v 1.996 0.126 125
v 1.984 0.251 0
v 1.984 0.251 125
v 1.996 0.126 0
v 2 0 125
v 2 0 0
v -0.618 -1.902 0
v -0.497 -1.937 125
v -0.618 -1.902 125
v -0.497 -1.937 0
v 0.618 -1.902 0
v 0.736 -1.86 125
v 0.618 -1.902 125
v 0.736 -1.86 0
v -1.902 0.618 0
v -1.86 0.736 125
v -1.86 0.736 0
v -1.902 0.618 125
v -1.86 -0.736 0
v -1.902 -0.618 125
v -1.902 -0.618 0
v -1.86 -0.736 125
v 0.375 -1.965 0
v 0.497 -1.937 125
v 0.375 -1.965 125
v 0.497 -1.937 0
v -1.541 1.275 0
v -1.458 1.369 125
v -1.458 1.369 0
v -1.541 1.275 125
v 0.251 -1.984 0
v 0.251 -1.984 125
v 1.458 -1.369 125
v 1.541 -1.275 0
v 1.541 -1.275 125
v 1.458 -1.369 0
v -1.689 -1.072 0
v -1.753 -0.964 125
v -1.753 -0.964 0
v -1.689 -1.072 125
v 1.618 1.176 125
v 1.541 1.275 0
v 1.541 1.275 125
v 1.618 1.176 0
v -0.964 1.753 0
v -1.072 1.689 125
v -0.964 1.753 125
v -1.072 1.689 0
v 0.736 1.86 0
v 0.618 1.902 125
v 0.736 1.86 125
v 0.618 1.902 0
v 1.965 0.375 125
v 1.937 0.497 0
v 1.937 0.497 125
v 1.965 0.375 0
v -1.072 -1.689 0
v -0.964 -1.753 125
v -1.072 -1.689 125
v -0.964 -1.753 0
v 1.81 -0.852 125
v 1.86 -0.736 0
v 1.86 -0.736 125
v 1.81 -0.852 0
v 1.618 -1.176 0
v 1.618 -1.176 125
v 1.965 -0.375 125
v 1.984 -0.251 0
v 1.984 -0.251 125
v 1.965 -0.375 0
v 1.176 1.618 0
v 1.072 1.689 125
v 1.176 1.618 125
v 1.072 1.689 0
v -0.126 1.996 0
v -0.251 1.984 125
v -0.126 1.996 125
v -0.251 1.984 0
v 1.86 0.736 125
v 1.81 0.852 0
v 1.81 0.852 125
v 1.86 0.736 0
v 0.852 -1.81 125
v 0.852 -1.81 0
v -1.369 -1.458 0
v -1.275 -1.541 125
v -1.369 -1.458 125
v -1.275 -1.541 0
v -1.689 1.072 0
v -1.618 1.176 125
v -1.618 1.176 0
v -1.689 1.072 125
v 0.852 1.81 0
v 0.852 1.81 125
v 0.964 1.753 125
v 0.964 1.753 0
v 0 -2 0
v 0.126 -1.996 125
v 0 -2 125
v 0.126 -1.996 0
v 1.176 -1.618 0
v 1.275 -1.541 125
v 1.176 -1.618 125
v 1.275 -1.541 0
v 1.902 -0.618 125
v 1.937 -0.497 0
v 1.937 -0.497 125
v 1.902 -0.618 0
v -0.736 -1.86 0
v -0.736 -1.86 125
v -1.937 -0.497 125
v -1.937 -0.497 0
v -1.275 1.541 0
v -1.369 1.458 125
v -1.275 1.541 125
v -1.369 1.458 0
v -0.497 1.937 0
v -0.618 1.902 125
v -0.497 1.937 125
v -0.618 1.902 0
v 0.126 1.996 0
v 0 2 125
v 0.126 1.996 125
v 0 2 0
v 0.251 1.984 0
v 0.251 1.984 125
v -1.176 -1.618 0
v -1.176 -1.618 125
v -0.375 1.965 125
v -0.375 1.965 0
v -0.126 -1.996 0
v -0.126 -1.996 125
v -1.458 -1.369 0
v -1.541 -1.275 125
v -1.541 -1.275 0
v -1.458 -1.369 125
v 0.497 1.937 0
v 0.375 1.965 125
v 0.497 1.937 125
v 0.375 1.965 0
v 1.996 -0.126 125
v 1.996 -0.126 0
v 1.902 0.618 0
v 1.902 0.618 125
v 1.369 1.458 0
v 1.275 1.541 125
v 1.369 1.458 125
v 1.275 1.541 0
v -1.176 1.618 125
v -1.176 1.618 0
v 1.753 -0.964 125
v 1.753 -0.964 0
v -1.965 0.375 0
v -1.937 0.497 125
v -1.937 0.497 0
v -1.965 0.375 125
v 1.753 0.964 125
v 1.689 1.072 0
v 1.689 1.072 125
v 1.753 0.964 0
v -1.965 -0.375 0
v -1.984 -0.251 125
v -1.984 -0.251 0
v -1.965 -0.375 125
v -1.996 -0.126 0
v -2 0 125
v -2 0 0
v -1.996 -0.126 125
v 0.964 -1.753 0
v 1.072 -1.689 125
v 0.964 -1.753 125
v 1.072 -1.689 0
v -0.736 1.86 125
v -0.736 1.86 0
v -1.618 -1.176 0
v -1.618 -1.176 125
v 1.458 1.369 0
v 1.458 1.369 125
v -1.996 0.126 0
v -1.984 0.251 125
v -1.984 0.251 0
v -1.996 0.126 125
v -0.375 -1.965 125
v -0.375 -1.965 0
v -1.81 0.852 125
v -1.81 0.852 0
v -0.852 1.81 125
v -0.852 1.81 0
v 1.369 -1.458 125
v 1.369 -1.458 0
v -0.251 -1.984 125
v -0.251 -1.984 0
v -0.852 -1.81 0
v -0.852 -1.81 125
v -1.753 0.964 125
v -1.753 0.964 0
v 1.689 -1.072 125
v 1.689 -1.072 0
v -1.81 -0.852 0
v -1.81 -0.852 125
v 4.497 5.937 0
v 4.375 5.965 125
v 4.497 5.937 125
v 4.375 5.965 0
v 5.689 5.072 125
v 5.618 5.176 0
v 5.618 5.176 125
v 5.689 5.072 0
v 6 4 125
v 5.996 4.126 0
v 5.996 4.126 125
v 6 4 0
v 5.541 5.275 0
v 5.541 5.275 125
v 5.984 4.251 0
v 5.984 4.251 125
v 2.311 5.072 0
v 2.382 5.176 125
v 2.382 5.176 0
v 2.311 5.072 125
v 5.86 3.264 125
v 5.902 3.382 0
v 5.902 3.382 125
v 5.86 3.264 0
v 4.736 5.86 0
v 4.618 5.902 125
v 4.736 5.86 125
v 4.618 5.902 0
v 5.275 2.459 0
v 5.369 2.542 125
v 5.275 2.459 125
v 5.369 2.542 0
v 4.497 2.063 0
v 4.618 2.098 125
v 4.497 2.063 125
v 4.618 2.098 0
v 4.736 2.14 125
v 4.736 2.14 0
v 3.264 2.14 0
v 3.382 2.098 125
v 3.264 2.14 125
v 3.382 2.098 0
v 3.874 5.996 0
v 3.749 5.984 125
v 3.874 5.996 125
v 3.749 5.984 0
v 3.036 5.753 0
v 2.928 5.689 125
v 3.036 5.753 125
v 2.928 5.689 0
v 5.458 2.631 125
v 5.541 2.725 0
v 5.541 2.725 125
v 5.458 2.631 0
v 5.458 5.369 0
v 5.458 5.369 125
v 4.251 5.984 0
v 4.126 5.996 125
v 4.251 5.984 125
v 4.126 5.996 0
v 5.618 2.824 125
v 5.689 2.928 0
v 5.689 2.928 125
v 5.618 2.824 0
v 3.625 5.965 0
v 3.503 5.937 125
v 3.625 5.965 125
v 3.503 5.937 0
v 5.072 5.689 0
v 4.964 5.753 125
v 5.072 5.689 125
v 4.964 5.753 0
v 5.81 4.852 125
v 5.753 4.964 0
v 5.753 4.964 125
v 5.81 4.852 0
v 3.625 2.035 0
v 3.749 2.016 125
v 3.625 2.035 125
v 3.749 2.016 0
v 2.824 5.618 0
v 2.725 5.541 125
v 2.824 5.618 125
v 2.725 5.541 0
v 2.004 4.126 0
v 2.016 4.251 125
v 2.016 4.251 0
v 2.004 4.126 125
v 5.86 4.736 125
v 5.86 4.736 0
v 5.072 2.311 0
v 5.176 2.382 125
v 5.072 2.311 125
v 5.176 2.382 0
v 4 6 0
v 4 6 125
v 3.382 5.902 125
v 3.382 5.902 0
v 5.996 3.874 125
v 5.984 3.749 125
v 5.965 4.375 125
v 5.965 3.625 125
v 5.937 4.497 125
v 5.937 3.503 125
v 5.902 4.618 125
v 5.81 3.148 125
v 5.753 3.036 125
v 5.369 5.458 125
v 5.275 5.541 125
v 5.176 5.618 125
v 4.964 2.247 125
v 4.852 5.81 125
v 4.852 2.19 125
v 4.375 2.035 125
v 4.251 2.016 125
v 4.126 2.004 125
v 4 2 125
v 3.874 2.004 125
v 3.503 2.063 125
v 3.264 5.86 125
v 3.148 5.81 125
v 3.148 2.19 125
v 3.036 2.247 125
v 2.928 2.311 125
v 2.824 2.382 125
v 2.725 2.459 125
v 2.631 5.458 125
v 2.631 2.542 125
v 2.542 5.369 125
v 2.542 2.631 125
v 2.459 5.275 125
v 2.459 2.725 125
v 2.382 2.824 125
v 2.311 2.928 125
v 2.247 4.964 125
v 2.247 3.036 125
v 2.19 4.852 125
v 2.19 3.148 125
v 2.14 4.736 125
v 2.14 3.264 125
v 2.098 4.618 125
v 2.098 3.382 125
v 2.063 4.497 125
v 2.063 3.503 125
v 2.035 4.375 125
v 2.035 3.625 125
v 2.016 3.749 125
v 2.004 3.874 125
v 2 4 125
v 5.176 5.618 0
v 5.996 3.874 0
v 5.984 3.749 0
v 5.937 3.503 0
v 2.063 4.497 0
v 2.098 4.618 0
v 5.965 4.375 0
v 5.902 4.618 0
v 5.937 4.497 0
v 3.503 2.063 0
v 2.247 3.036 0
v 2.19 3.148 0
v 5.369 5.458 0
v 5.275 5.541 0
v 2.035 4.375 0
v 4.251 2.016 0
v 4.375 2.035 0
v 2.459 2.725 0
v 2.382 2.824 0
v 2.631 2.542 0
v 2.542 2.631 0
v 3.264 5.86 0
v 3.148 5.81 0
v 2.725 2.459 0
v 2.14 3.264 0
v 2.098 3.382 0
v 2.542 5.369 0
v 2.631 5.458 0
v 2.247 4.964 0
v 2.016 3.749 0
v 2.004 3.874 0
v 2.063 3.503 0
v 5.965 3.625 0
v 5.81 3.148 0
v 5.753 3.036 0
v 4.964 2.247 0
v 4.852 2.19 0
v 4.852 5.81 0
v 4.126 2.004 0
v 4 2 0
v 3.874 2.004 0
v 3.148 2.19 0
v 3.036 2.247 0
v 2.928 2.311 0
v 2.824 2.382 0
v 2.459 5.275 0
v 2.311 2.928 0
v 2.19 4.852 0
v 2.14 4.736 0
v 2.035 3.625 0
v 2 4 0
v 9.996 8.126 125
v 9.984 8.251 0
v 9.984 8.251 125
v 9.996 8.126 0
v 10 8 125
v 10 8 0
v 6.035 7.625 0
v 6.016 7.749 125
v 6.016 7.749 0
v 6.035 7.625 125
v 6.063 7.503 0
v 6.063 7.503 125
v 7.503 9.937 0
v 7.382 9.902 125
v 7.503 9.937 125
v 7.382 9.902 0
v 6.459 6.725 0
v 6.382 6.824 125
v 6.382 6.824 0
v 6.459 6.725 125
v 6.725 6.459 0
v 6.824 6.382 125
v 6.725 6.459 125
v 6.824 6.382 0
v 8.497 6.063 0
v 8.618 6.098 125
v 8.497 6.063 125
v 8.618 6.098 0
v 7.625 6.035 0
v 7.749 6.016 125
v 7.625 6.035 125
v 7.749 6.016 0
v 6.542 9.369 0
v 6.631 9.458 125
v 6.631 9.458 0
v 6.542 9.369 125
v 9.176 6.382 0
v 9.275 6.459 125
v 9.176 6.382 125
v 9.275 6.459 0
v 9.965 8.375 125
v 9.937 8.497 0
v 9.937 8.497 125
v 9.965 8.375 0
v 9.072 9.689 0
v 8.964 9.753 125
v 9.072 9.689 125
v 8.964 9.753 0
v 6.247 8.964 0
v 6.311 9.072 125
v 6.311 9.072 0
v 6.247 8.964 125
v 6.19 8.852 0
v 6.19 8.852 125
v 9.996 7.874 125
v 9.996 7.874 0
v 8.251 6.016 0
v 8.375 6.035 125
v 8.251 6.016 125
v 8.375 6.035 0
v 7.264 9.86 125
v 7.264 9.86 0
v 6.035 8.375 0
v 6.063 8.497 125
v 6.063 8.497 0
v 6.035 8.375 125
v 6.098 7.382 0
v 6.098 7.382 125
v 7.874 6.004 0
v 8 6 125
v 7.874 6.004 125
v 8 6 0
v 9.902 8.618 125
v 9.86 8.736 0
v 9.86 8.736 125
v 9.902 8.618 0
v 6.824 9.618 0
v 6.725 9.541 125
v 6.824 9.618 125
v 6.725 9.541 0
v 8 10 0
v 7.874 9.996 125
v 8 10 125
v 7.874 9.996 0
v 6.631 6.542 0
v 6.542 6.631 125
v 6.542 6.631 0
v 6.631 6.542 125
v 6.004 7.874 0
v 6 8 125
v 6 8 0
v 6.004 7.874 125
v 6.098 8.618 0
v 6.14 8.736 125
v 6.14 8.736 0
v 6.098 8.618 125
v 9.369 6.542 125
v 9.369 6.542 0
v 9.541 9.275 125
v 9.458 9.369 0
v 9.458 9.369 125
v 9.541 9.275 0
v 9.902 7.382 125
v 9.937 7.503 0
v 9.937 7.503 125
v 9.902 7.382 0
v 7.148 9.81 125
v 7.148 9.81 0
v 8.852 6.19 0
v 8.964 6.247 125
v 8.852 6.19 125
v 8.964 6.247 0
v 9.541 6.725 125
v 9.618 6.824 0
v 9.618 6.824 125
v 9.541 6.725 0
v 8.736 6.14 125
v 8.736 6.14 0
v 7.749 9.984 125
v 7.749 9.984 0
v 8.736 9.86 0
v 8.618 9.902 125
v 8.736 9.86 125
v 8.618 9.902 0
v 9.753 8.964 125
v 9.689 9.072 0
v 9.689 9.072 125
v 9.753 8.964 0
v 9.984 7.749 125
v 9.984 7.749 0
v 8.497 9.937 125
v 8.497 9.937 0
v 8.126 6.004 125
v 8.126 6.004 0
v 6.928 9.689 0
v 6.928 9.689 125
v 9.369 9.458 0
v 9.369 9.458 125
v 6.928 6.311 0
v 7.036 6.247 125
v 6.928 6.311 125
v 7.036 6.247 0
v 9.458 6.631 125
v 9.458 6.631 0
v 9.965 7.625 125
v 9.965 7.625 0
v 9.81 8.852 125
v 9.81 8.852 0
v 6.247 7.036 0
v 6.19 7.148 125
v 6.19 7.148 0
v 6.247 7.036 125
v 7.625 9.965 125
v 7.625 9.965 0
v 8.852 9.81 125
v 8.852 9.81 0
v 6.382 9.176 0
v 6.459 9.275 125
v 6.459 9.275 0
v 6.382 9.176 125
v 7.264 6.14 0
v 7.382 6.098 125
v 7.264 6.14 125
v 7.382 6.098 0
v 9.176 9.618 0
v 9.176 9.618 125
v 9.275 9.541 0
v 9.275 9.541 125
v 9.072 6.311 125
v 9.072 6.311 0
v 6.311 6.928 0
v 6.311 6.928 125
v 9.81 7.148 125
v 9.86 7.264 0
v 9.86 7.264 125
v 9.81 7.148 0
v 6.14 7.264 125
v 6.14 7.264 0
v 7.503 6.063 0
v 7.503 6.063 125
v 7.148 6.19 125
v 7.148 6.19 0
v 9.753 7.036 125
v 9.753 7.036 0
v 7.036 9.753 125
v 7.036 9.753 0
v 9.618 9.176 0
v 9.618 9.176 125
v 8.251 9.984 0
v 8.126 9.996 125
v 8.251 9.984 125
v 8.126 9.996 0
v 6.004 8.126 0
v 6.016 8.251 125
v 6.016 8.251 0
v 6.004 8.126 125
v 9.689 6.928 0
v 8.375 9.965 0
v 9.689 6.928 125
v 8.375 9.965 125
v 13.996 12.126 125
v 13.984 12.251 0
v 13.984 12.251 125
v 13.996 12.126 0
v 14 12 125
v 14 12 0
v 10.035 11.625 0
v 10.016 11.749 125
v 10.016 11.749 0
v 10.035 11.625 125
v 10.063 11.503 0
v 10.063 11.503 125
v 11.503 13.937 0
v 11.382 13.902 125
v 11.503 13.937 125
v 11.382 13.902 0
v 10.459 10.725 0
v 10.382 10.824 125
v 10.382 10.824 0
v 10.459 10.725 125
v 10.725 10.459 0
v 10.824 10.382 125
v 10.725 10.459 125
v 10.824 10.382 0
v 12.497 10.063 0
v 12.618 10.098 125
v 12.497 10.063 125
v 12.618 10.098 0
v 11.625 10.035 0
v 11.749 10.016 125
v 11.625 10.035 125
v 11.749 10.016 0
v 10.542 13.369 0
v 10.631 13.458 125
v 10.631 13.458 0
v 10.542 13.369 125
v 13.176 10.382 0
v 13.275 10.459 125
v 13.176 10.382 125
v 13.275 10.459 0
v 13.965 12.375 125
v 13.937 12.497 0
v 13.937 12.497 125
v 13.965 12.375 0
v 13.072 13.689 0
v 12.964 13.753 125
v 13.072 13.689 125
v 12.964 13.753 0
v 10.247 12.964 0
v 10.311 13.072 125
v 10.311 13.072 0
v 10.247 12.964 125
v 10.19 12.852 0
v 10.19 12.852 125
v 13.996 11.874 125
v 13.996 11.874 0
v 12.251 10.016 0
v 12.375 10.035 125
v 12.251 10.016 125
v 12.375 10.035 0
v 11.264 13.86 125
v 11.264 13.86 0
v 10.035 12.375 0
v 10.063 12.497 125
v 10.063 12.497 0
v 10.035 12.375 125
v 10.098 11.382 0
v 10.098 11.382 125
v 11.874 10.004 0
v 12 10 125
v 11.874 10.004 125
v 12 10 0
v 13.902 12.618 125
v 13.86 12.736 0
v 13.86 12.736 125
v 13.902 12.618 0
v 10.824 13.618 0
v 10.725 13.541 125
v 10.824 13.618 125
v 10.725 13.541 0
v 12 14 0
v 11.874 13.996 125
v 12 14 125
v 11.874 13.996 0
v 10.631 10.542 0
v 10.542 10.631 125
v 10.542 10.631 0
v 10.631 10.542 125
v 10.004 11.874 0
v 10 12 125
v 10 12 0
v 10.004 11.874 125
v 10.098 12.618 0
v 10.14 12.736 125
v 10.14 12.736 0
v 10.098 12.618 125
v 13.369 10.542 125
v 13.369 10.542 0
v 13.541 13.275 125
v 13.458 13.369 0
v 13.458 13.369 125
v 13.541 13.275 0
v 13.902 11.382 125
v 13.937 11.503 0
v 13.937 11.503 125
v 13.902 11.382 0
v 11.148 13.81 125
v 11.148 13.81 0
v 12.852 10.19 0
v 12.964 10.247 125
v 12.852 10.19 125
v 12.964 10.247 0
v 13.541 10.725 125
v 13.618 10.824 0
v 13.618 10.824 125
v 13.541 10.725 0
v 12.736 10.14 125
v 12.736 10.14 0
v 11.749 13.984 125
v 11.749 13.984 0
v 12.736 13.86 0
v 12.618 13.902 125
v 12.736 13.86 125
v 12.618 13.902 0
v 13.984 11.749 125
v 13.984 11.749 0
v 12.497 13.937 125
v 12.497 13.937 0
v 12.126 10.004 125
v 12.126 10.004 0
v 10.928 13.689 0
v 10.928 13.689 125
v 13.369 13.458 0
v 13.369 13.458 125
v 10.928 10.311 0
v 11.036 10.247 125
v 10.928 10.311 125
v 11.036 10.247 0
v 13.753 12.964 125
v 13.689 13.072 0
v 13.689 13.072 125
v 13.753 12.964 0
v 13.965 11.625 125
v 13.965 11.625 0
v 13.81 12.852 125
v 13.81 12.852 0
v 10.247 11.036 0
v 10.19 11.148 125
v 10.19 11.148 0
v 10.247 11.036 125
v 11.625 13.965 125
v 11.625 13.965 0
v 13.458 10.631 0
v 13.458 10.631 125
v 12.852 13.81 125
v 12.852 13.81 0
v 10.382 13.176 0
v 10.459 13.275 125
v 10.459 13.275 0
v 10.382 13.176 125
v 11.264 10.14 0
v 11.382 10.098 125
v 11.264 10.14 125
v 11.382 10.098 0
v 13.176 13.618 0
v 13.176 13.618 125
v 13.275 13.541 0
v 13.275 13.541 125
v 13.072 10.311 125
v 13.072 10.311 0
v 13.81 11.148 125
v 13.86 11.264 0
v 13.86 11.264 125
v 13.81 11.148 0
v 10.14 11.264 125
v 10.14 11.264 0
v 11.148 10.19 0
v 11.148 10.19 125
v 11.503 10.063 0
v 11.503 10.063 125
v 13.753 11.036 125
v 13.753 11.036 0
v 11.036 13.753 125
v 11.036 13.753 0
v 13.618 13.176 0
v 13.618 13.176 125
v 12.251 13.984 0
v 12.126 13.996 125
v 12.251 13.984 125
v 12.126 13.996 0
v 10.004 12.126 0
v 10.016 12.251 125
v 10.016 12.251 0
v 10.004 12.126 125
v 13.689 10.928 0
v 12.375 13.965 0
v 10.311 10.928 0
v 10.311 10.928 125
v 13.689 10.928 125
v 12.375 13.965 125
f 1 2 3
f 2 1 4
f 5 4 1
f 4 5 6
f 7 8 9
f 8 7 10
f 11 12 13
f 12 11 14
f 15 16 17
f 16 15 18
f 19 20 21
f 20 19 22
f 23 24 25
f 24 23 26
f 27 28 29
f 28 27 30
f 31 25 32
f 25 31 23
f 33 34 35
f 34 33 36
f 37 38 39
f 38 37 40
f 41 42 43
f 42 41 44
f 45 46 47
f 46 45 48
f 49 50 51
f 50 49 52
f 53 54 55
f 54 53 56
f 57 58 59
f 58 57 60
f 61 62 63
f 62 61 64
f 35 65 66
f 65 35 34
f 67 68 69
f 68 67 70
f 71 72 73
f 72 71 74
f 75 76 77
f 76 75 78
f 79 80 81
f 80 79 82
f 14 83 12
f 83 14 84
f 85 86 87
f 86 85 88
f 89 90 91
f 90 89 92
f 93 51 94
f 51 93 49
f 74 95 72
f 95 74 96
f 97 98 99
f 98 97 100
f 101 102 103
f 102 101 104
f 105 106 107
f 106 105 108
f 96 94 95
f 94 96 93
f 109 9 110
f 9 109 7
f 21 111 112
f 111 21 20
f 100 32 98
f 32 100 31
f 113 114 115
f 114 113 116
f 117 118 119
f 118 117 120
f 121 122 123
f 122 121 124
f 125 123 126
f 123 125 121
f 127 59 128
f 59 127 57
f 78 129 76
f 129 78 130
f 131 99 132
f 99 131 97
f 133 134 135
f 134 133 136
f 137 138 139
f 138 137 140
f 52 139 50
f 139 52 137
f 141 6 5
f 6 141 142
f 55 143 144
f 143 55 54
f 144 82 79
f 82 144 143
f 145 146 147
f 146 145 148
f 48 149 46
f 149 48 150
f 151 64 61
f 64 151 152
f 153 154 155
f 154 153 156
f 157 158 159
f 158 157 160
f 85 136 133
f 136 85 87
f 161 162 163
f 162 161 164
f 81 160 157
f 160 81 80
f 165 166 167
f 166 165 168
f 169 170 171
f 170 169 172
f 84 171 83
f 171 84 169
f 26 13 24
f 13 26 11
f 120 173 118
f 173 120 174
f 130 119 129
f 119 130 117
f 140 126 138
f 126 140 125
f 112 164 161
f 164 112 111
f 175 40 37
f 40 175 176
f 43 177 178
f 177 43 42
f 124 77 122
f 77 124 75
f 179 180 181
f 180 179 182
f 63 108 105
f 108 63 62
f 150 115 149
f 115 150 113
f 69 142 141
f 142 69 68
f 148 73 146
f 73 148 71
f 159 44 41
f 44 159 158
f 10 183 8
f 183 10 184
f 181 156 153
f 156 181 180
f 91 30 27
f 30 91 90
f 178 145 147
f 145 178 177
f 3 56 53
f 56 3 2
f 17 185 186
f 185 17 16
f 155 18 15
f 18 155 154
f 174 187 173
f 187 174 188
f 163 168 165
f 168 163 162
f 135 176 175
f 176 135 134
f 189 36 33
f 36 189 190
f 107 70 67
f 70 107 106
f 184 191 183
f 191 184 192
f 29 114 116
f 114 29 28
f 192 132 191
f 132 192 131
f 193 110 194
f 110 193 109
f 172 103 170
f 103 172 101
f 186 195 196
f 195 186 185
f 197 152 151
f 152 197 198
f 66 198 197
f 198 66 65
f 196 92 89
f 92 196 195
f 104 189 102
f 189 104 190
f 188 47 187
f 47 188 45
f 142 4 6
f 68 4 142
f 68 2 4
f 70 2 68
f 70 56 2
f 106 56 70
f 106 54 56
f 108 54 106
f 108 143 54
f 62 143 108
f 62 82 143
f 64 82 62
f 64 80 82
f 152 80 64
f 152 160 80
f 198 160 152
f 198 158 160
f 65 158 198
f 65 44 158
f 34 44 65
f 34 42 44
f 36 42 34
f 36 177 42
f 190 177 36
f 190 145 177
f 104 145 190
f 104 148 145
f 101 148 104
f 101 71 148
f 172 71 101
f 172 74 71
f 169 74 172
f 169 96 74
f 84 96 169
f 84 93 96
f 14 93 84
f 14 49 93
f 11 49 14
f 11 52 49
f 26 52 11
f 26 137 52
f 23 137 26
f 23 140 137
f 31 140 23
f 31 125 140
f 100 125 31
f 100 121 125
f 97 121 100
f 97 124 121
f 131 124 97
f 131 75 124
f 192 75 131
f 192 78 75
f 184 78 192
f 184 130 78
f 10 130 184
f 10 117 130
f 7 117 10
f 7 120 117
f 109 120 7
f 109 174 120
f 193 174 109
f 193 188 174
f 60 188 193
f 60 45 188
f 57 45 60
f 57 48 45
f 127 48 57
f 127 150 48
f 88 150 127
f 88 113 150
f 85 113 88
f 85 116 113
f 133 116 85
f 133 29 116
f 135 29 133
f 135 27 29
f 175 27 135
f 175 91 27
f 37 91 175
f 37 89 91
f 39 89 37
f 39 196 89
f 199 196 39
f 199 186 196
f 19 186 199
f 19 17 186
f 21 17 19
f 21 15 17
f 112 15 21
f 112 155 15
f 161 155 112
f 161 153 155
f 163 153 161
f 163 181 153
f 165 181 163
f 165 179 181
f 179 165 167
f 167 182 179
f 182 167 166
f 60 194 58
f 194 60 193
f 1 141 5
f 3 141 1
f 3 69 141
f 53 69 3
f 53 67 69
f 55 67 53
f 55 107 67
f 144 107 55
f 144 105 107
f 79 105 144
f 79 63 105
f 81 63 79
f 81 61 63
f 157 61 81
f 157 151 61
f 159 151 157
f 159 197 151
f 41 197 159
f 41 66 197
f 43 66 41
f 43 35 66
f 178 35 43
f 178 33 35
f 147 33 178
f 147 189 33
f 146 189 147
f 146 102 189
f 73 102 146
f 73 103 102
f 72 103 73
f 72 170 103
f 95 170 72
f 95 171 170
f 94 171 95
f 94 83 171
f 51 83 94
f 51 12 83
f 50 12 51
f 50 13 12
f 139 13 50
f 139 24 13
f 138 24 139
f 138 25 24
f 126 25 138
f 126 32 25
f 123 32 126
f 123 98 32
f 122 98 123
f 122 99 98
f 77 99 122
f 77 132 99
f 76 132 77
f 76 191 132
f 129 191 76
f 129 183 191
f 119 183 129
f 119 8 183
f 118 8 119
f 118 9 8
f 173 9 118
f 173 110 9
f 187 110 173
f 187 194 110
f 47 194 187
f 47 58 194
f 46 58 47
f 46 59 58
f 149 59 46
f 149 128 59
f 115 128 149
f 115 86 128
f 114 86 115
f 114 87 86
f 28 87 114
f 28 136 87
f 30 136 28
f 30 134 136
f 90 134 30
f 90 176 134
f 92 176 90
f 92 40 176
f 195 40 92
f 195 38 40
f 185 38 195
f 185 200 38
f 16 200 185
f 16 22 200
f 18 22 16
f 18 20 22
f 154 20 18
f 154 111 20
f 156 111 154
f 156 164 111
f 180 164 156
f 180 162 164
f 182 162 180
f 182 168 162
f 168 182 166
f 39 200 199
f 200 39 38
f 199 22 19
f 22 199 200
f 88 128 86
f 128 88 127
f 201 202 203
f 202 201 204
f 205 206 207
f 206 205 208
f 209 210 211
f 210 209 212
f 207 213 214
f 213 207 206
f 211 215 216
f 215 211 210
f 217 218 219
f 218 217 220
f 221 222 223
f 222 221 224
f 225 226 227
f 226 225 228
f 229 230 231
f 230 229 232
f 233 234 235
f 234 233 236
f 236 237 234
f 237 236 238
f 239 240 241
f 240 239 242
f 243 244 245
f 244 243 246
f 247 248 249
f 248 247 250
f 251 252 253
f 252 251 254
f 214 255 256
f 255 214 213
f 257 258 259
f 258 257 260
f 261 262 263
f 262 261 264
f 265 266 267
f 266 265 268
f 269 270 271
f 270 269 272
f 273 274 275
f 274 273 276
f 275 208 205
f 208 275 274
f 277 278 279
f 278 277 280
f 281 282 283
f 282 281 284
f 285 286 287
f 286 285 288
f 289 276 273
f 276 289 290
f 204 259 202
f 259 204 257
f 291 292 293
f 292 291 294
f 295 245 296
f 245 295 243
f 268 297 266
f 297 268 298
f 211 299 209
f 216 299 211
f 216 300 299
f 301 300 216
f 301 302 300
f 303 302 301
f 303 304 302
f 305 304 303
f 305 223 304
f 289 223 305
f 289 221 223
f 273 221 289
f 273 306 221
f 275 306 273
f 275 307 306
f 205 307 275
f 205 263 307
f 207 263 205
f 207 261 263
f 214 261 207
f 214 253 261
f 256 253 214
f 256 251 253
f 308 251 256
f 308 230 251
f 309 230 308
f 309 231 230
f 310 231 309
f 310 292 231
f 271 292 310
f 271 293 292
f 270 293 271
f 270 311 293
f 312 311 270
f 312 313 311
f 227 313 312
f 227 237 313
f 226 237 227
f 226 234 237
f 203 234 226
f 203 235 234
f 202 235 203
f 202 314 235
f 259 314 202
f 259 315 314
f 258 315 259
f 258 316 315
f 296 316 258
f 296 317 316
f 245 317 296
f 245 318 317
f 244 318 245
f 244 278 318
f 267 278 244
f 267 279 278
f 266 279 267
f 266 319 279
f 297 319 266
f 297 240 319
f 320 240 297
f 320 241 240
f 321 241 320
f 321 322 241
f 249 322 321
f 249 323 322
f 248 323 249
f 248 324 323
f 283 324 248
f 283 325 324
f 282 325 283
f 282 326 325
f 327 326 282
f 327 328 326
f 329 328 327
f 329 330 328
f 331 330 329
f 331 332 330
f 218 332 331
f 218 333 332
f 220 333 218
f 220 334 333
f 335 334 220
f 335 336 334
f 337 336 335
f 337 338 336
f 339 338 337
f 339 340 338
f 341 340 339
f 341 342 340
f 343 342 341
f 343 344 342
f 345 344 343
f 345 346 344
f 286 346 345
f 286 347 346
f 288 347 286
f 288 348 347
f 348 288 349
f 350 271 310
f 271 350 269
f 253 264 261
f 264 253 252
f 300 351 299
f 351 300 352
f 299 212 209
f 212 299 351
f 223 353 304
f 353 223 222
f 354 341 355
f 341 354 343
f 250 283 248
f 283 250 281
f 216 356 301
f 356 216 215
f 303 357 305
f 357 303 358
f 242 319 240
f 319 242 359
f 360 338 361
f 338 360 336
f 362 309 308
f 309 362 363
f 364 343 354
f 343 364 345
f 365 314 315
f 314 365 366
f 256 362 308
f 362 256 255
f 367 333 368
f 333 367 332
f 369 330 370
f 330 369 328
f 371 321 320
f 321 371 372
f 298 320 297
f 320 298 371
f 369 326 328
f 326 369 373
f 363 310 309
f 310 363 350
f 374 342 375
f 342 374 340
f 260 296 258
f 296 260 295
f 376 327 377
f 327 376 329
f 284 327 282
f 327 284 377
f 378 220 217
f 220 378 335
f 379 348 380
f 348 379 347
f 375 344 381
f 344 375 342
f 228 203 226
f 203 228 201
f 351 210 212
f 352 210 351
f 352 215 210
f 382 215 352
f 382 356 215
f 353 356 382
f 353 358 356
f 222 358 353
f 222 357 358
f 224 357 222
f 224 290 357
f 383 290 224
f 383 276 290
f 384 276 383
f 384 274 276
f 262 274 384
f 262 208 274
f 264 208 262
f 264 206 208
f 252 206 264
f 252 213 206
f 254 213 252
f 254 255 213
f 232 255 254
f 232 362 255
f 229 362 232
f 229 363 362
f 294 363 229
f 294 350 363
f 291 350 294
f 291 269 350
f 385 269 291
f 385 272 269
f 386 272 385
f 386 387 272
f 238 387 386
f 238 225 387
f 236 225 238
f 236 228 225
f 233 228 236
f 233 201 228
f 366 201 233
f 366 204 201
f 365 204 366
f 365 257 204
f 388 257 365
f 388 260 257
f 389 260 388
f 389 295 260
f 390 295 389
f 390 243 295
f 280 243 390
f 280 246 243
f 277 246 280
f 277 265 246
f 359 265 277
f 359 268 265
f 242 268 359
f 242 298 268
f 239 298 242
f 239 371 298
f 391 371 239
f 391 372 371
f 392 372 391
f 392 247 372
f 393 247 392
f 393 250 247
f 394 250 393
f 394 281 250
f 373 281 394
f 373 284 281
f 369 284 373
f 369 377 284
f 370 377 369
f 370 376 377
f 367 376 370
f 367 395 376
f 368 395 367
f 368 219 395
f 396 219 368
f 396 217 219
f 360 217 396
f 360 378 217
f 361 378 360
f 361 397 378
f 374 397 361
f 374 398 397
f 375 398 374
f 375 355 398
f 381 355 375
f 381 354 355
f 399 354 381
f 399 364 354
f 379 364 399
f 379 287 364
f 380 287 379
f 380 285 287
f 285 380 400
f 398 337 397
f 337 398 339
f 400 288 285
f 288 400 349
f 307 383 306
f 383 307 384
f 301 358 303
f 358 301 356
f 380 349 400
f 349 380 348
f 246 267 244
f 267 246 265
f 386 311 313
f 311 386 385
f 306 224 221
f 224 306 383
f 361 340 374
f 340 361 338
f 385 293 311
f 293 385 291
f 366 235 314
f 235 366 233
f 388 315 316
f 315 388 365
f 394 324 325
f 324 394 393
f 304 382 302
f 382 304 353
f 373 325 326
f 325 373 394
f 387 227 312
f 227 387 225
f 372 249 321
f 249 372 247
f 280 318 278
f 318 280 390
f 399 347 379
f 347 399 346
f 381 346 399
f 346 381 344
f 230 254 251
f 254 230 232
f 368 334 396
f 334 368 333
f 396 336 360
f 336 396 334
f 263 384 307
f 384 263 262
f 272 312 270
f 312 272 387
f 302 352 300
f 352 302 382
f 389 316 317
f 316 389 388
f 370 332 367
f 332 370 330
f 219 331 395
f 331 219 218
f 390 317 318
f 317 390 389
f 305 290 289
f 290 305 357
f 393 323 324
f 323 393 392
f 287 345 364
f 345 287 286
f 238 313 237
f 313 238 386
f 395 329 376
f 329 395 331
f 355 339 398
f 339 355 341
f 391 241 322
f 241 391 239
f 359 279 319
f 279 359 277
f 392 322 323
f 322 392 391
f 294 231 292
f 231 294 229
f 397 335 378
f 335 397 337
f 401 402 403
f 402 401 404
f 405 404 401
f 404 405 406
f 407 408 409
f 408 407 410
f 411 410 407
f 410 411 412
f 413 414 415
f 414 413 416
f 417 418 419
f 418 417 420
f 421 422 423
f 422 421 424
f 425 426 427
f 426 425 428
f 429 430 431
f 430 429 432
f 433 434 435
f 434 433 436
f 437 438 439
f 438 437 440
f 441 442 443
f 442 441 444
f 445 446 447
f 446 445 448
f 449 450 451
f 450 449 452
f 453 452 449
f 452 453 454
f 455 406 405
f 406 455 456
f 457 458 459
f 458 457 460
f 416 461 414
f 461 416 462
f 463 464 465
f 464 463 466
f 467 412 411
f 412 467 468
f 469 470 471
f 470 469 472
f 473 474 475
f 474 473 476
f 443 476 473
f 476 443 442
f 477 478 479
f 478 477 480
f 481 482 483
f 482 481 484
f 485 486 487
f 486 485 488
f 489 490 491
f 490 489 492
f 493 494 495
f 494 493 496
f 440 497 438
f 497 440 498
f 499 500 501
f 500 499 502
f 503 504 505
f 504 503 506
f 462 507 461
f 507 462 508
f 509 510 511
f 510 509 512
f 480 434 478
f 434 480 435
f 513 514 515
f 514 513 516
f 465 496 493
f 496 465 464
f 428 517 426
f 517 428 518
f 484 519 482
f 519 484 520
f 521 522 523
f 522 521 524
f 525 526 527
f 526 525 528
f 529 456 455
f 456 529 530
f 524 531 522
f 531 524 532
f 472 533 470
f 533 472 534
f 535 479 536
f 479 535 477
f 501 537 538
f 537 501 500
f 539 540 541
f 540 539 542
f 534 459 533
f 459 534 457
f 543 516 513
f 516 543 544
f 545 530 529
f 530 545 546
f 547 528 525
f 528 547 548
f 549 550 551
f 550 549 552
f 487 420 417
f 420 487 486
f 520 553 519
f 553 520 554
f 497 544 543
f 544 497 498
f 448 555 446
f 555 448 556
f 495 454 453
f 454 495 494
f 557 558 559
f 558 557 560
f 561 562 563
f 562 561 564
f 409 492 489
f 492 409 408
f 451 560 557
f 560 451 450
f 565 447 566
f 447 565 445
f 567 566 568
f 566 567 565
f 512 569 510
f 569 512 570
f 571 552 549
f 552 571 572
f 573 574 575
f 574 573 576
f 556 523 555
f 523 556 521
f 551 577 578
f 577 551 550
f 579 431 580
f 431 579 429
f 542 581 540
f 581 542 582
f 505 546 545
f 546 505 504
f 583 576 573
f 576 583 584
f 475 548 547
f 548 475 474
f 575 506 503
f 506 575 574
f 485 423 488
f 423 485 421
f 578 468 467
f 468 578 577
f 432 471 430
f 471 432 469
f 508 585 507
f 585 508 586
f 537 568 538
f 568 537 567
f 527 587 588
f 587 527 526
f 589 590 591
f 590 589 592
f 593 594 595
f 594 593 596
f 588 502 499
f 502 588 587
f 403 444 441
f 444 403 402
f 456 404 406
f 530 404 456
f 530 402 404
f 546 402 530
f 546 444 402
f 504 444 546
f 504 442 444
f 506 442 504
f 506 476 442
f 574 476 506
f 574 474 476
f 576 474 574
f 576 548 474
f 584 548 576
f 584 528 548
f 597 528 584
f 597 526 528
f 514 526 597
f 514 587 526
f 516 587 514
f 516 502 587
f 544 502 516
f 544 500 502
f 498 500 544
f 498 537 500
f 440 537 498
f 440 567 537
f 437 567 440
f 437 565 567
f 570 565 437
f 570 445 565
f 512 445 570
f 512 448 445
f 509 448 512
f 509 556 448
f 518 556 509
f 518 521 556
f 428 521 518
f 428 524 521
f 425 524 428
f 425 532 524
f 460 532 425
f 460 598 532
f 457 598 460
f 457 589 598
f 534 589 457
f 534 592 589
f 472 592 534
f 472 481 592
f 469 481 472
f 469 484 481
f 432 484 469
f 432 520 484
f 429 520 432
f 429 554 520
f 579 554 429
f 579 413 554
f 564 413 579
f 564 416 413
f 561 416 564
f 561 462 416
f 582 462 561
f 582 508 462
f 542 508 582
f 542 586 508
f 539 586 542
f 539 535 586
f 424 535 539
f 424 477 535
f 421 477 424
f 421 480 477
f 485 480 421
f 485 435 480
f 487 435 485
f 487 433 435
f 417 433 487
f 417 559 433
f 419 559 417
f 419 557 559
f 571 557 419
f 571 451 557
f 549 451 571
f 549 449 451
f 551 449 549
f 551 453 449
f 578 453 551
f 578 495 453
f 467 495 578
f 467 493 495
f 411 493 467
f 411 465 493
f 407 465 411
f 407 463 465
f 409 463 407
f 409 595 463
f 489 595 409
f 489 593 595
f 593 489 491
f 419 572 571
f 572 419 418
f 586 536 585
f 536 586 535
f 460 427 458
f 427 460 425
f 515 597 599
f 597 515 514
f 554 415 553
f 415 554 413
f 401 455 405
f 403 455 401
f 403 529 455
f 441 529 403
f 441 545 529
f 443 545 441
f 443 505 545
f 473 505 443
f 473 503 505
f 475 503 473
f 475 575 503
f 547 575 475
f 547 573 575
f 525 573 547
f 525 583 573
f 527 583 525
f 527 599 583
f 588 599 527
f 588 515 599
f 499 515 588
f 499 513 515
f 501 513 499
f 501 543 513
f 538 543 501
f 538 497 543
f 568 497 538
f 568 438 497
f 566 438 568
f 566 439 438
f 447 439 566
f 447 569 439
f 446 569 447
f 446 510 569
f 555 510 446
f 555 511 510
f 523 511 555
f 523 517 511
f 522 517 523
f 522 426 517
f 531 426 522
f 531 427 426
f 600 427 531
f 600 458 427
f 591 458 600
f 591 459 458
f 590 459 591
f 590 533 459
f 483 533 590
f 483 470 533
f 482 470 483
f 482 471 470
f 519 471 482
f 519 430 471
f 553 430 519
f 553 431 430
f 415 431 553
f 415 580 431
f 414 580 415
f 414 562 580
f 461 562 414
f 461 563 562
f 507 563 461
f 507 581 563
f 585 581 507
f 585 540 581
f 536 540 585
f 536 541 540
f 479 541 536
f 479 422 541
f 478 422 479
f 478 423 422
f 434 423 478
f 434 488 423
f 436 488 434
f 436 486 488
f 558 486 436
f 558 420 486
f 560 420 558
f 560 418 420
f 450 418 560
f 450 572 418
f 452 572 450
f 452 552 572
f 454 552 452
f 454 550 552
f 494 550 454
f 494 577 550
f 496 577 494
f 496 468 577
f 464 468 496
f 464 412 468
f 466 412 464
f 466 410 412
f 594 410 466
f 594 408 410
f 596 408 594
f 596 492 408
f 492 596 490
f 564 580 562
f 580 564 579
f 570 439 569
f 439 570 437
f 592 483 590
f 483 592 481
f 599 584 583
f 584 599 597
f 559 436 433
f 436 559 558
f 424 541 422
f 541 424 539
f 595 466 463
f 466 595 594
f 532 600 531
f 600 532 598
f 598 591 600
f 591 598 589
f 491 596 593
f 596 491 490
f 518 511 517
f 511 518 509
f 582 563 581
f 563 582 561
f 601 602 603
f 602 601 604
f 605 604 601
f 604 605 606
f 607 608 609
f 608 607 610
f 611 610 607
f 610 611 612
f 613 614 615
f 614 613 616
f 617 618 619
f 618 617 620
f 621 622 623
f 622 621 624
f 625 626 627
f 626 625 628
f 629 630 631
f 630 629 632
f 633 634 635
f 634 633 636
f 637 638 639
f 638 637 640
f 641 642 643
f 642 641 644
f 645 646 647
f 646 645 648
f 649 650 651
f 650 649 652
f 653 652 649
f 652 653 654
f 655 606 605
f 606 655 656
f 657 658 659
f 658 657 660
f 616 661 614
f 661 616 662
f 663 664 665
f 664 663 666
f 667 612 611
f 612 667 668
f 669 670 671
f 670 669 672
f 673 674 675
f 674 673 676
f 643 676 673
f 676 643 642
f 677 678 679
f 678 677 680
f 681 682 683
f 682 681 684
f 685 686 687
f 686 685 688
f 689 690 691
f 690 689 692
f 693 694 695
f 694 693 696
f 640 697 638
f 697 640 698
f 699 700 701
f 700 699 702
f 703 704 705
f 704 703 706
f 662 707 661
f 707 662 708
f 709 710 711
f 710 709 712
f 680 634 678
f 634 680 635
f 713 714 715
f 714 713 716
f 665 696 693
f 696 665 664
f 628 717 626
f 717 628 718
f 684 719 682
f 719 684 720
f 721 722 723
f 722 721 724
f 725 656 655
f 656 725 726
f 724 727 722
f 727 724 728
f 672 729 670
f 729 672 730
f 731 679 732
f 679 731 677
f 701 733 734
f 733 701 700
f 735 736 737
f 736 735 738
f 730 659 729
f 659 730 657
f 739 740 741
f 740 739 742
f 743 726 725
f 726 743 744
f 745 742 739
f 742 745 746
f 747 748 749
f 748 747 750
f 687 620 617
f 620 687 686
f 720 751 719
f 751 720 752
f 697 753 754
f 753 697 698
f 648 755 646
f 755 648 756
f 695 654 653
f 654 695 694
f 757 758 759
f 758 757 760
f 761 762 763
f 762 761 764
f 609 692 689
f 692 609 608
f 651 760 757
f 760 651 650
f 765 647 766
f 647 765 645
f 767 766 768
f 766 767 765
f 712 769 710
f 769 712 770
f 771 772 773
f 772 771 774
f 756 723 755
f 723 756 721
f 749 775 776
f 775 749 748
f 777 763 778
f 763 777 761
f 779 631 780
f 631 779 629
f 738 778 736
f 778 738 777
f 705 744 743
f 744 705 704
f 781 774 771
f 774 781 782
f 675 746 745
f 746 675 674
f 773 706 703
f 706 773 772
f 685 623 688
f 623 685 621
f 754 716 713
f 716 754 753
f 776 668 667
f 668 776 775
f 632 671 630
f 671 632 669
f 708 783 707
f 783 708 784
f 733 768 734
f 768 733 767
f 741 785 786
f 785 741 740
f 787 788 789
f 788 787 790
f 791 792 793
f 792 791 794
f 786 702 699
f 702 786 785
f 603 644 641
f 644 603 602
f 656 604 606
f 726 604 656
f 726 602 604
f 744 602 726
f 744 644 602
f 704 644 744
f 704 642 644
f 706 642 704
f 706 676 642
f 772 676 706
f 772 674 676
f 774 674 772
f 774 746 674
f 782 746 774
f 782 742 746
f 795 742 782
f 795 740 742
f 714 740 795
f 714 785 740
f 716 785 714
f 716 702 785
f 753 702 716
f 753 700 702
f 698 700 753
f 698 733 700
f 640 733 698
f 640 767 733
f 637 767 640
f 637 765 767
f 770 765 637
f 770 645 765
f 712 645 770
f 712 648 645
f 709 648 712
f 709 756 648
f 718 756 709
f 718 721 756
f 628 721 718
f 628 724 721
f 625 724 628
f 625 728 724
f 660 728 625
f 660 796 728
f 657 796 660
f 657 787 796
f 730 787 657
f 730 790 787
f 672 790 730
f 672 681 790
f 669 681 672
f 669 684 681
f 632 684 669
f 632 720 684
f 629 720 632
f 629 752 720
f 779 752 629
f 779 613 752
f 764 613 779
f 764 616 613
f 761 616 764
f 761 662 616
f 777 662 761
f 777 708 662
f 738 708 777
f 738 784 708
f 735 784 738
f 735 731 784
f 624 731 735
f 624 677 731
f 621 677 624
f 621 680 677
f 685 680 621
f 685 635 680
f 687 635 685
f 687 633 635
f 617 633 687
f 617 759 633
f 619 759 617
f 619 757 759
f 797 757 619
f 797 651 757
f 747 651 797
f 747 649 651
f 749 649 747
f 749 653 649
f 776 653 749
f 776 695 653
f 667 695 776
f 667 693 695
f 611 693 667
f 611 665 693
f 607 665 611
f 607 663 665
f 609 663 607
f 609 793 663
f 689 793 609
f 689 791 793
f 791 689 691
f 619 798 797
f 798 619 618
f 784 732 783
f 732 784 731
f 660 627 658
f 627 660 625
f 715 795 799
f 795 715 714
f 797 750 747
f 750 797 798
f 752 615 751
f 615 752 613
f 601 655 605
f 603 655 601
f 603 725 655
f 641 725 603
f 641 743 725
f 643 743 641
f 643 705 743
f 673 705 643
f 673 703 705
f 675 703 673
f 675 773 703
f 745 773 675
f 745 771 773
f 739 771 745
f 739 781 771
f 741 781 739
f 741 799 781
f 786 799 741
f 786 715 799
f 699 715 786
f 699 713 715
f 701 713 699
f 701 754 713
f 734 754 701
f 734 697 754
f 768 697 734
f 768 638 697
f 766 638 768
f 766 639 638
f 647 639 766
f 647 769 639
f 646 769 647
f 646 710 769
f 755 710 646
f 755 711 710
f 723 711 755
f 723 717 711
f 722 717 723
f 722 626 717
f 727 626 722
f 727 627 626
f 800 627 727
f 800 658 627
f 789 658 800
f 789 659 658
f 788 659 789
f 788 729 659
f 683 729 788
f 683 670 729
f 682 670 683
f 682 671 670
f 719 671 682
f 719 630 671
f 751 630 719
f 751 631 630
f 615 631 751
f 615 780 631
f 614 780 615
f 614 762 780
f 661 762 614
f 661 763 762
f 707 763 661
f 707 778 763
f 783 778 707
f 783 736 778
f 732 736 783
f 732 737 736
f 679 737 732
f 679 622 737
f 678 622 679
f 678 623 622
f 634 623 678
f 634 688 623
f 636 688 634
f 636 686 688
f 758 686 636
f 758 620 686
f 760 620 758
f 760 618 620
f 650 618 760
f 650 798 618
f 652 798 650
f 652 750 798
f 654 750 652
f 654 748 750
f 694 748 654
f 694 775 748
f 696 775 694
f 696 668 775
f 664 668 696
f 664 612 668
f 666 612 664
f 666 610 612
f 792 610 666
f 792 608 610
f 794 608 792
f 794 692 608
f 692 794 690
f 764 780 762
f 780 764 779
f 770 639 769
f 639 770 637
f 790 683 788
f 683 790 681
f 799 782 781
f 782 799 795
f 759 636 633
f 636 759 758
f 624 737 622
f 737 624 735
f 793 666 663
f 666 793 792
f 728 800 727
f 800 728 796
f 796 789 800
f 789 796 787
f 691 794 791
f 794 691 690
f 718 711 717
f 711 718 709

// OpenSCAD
cylinder(h=125,d=4,$fn=100);
translate([4,4,0]) cylinder(h=125,d=4,$fn=100);
translate([4,4,0]) translate([4,4,0]) cylinder(h=125,d=4,$fn=100);
translate([4,4,0]) translate([4,4,0]) translate([4,4,0]) cylinder(h=125,d=4,$fn=100);
